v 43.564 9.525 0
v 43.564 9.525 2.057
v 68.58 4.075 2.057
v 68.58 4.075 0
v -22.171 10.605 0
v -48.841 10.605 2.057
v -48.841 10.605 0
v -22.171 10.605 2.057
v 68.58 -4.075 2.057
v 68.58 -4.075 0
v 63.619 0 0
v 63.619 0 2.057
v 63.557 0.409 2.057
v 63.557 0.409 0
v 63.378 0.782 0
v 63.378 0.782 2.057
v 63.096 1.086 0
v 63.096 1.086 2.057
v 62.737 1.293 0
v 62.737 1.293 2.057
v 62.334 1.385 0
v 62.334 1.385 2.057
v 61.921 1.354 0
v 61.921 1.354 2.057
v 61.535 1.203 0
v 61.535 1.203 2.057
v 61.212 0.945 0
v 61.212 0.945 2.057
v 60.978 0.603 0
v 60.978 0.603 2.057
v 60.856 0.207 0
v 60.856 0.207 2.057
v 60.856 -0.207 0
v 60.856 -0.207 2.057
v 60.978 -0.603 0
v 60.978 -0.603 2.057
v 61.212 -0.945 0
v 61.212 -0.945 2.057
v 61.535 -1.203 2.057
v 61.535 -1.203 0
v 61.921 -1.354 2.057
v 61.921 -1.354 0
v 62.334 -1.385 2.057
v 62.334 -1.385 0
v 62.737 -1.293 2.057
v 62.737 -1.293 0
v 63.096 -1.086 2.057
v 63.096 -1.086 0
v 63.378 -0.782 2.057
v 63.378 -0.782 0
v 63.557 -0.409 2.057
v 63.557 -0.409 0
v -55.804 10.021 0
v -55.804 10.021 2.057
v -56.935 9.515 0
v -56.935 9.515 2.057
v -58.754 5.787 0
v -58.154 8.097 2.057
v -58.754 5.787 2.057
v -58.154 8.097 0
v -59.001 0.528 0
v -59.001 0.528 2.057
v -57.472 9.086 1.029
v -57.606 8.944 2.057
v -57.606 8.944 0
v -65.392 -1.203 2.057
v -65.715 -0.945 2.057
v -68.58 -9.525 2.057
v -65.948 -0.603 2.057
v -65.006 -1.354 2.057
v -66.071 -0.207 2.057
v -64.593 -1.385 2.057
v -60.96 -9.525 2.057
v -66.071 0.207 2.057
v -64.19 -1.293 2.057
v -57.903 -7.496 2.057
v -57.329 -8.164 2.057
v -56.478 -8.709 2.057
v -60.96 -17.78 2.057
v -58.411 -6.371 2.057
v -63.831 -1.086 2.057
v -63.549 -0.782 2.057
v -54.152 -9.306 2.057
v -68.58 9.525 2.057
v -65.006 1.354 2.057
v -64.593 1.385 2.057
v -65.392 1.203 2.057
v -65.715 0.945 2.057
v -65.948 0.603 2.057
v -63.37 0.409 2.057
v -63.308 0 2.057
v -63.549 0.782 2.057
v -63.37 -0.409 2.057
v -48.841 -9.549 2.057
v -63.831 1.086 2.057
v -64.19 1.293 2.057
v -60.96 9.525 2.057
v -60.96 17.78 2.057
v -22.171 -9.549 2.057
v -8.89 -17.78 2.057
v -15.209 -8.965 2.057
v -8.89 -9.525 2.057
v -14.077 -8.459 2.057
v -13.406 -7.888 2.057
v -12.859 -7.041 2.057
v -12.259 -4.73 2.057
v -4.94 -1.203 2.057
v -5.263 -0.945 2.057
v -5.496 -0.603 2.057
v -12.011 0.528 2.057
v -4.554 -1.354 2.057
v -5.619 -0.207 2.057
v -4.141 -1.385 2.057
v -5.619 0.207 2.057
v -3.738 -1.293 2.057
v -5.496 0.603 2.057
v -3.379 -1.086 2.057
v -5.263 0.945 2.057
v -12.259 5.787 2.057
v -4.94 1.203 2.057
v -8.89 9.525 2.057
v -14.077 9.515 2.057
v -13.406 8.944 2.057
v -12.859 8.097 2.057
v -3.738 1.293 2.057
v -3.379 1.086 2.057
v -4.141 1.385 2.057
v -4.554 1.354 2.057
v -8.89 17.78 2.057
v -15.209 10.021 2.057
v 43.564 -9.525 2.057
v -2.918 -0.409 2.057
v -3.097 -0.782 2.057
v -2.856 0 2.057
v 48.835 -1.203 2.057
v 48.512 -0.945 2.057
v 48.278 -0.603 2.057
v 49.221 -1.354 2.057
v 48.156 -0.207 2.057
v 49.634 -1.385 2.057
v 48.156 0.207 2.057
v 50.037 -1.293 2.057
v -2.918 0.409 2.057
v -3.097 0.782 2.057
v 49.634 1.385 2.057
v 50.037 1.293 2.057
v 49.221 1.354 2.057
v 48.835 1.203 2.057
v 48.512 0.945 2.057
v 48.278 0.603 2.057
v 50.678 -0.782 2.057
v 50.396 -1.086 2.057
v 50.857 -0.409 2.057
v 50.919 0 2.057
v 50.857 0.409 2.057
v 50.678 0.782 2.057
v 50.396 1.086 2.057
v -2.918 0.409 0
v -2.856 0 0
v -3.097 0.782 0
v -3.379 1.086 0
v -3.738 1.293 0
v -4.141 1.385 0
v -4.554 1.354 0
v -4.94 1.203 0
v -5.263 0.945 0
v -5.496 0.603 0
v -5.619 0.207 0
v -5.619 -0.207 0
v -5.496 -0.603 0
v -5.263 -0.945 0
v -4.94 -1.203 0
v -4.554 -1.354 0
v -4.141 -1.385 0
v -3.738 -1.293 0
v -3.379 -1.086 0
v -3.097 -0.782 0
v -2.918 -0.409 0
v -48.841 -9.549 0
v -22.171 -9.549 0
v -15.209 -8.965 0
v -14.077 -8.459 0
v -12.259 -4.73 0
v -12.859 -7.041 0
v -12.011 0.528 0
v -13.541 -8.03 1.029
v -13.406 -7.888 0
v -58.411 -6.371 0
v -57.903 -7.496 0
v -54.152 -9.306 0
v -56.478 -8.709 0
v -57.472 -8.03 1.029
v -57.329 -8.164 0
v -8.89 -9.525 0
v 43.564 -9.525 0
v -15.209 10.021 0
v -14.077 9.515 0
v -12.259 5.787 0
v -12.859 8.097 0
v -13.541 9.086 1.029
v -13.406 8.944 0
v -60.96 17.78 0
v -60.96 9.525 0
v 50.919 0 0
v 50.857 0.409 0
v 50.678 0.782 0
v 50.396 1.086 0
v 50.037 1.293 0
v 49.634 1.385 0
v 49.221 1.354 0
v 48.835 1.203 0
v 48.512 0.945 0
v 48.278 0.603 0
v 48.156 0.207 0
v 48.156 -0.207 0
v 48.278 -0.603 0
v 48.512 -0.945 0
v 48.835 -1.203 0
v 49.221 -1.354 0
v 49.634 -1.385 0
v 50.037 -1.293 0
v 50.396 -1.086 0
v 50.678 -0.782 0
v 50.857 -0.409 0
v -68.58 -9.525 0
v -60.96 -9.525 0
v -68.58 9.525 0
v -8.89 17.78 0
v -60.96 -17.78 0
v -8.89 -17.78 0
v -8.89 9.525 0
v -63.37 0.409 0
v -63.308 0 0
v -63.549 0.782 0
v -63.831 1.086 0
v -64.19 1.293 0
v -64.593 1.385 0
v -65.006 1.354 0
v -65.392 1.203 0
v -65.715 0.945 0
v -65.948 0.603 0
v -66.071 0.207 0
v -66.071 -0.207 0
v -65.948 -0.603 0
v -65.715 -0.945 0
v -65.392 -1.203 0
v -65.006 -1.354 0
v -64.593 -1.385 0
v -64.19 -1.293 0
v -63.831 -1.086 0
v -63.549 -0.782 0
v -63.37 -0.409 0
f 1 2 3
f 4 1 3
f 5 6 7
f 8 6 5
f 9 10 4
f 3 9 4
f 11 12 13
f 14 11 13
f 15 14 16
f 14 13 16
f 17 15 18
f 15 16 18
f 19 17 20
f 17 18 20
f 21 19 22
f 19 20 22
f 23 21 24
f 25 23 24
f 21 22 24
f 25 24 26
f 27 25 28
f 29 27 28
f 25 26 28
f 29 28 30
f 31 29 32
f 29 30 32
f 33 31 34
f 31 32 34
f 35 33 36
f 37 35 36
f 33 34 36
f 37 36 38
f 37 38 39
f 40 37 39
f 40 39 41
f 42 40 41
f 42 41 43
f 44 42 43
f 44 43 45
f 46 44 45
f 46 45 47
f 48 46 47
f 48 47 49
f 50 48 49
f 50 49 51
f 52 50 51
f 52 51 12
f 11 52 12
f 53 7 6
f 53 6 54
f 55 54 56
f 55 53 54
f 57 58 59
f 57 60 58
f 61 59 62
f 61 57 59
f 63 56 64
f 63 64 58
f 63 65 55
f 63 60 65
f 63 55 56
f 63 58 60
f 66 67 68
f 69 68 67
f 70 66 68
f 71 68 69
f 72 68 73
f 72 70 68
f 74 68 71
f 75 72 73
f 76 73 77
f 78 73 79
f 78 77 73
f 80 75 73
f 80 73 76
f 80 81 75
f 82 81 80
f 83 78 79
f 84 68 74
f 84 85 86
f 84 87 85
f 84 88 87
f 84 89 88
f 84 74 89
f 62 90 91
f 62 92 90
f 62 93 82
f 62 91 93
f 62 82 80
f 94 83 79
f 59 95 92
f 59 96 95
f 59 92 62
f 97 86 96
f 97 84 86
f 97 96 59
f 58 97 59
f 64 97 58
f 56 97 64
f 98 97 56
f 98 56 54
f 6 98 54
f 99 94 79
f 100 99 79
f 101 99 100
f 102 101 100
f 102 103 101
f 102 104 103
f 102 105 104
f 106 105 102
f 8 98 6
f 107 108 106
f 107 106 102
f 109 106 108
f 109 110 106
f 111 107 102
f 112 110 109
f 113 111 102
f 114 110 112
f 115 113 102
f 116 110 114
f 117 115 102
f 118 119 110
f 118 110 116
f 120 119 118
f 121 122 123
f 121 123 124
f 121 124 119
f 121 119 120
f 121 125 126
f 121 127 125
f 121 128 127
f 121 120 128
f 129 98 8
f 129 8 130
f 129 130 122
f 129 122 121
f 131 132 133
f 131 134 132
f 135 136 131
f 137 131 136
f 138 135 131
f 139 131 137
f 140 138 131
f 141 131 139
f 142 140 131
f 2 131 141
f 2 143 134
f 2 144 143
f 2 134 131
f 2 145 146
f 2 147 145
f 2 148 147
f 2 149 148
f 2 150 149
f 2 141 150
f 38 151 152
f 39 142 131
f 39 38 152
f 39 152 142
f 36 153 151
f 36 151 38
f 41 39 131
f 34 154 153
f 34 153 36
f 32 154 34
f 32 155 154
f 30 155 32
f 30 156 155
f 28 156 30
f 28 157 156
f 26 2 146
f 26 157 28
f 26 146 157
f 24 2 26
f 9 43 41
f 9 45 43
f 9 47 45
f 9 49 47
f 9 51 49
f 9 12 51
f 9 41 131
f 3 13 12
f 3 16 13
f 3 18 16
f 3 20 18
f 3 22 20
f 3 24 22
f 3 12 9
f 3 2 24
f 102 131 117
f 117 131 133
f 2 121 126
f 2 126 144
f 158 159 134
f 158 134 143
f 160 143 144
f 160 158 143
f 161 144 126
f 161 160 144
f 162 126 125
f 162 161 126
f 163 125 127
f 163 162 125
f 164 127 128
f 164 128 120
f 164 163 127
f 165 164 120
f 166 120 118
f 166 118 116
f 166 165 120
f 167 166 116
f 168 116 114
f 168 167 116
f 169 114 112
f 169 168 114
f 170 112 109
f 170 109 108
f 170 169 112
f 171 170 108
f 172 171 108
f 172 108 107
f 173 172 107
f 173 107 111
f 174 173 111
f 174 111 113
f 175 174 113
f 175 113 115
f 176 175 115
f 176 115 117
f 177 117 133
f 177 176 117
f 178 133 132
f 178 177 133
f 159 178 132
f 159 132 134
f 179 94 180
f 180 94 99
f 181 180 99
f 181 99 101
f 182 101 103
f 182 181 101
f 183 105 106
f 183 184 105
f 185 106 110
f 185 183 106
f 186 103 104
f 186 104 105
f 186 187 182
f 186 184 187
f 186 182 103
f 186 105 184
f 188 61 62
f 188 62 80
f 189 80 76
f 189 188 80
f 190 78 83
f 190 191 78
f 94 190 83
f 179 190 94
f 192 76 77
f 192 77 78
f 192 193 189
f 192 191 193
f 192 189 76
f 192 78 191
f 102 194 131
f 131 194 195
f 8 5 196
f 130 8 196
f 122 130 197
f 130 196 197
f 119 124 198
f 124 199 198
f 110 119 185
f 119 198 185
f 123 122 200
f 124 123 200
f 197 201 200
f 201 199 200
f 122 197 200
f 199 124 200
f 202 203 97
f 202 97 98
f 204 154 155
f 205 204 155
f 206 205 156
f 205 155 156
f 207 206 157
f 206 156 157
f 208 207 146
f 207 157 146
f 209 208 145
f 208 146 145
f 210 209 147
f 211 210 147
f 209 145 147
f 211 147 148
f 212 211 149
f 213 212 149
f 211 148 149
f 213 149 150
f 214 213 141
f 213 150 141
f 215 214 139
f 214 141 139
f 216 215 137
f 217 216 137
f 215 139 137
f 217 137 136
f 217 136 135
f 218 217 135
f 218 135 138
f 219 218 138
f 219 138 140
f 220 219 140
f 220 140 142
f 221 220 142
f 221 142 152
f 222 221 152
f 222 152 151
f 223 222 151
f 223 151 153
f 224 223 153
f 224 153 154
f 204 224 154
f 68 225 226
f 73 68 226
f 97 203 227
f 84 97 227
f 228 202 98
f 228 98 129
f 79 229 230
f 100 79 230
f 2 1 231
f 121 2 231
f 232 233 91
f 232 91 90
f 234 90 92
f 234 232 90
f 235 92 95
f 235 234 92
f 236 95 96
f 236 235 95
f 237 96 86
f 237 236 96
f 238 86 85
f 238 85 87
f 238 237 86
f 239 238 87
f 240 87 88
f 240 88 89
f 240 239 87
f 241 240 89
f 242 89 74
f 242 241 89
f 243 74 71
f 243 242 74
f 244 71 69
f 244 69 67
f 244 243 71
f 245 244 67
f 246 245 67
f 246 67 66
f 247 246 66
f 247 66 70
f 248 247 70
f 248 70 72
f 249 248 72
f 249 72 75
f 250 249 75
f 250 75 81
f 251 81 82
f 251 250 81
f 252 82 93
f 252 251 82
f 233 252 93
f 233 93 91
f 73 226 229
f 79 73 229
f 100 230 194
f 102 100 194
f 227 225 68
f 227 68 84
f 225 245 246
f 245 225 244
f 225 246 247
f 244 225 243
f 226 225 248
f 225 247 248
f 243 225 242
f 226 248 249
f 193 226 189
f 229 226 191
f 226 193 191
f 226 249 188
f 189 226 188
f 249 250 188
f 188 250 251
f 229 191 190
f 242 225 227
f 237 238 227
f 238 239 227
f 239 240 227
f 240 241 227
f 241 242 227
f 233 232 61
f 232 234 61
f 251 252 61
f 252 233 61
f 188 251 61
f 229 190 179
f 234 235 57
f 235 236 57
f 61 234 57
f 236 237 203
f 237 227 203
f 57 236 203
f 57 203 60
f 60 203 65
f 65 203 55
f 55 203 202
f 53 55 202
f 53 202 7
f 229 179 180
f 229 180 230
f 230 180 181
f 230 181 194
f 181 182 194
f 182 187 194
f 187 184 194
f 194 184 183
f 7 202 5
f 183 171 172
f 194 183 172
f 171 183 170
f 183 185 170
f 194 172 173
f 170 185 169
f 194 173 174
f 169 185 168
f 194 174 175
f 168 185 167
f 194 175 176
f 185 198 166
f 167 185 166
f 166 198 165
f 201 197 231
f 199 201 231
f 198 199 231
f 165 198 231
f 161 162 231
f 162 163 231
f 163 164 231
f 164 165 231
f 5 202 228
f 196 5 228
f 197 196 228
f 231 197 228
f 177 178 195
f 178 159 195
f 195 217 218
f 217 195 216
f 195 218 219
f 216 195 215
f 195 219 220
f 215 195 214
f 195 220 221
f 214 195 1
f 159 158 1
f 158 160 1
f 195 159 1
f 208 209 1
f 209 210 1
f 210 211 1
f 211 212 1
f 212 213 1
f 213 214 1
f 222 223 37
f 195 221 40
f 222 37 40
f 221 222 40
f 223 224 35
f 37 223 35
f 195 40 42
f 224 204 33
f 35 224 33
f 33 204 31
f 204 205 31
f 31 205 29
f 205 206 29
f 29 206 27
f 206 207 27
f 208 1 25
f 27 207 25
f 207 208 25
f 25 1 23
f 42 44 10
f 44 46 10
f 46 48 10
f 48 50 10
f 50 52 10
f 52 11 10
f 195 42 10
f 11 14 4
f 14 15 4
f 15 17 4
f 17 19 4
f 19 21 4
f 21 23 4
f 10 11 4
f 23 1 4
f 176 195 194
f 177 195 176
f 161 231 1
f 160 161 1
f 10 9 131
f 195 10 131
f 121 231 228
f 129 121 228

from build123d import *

# Parameters (mm, degrees)
F0_W        = 77.47
F0_H        = 19.05
F0_R        = 1.3890625
F0_W_2      = 52.07
F0_H_2      = 8.255
F0_W_3      = 7.62
F1_DEPTH    = 2.0574
F2_R        = 1.3890625
F2_W        = 46.99
F2_H        = 20.1539304107
F3_DEPTH    = 25.4
F4_T1_DEPTH = 2.0574


# Not quite as in the source:
# - a fillet or chamfer that OpenCascade refuses, or shapes differently, is made with other operations: its cross-section is extruded or revolved along the edge and cut away or added


with BuildPart() as f1:
    # F0 (on Top) → F1 (new body)
    with BuildSketch(Plane.XY):
        with Locations((29.845, 0)):
            Rectangle(F0_W, F0_H)
        with Locations((-4.2449974041, 0)):
            Circle(F0_R, mode=Mode.SUBTRACT)
        with Locations((-34.925, -13.6525)):
            Rectangle(F0_W_2, F0_H_2)
        with Locations((-34.925, 0)):
            Rectangle(F0_W_2, F0_H)
        with Locations((-64.77, 0)):
            Rectangle(F0_W_3, F0_H)
        with Locations((-64.6969974041, 0)):
            Circle(F0_R, mode=Mode.SUBTRACT)
        with Locations((-34.925, 13.6525)):
            Rectangle(F0_W_2, F0_H_2)
    extrude(amount=F1_DEPTH)

    # F2 (on face) → F3 (cut)
    with BuildSketch(Plane.XY.offset(2.0574)):
        Polygon((43.5640997417, 9.525), (68.58, 4.0749409236), (68.58, 9.525), align=None)
        Polygon((68.58, -9.525), (68.58, -4.0749409236), (43.5640997417, -9.525), align=None)
        with Locations((49.53, 0)):
            Circle(F2_R)
        with Locations((62.23, 0)):
            Circle(F2_R)
        with Locations((-35.5063436133, 0.5281241611)):
            Rectangle(F2_W, F2_H)
    extrude(amount=-F3_DEPTH, mode=Mode.SUBTRACT)

    # F4: fillet of radius 10.16 on 4 edges, made by hand

    # F4_s2 → F4_t1 (join)
    with BuildSketch(Plane.XY):
        with BuildLine():
            add(Edge.make_bspline(
                [(-22.1713436133, 10.6050893664), (-12.0113436133, 10.6050893664), (-12.0113436133, 0.4450893664)],
                knots=[0, 0, 0, 1, 1, 1], degree=2, weights=[1, 2.3333333333, 1]))
            Line((-12.0113436133, 0.4450893664), (-12.0113436133, 10.6050893664))
            Line((-12.0113436133, 10.6050893664), (-22.1713436133, 10.6050893664))
        make_face()
        with BuildLine():
            add(Edge.make_bspline(
                [(-48.8413436133, 10.6050893664), (-59.0013436133, 10.6050893664), (-59.0013436133, 0.4450893664)],
                knots=[0, 0, 0, 1, 1, 1], degree=2, weights=[1, 2.3333333333, 1]))
            Line((-59.0013436133, 0.4450893664), (-59.0013436133, 10.6050893664))
            Line((-59.0013436133, 10.6050893664), (-48.8413436133, 10.6050893664))
        make_face()
        with BuildLine():
            add(Edge.make_bspline(
                [(-59.0013436133, 0.6111589557), (-59.0013436133, -9.5488410443), (-48.8413436133, -9.5488410443)],
                knots=[0, 0, 0, 1, 1, 1], degree=2, weights=[1, 2.3333333333, 1]))
            Line((-48.8413436133, -9.5488410443), (-59.0013436133, -9.5488410443))
            Line((-59.0013436133, -9.5488410443), (-59.0013436133, 0.6111589557))
        make_face()
        with BuildLine():
            add(Edge.make_bspline(
                [(-22.1713436133, -9.5488410443), (-12.0113436133, -9.5488410443), (-12.0113436133, 0.6111589557)],
                knots=[0, 0, 0, 1, 1, 1], degree=2, weights=[1, 2.3333333333, 1]))
            Line((-12.0113436133, 0.6111589557), (-12.0113436133, -9.5488410443))
            Line((-12.0113436133, -9.5488410443), (-22.1713436133, -9.5488410443))
        make_face()
    extrude(amount=F4_T1_DEPTH)


solid = f1.part
